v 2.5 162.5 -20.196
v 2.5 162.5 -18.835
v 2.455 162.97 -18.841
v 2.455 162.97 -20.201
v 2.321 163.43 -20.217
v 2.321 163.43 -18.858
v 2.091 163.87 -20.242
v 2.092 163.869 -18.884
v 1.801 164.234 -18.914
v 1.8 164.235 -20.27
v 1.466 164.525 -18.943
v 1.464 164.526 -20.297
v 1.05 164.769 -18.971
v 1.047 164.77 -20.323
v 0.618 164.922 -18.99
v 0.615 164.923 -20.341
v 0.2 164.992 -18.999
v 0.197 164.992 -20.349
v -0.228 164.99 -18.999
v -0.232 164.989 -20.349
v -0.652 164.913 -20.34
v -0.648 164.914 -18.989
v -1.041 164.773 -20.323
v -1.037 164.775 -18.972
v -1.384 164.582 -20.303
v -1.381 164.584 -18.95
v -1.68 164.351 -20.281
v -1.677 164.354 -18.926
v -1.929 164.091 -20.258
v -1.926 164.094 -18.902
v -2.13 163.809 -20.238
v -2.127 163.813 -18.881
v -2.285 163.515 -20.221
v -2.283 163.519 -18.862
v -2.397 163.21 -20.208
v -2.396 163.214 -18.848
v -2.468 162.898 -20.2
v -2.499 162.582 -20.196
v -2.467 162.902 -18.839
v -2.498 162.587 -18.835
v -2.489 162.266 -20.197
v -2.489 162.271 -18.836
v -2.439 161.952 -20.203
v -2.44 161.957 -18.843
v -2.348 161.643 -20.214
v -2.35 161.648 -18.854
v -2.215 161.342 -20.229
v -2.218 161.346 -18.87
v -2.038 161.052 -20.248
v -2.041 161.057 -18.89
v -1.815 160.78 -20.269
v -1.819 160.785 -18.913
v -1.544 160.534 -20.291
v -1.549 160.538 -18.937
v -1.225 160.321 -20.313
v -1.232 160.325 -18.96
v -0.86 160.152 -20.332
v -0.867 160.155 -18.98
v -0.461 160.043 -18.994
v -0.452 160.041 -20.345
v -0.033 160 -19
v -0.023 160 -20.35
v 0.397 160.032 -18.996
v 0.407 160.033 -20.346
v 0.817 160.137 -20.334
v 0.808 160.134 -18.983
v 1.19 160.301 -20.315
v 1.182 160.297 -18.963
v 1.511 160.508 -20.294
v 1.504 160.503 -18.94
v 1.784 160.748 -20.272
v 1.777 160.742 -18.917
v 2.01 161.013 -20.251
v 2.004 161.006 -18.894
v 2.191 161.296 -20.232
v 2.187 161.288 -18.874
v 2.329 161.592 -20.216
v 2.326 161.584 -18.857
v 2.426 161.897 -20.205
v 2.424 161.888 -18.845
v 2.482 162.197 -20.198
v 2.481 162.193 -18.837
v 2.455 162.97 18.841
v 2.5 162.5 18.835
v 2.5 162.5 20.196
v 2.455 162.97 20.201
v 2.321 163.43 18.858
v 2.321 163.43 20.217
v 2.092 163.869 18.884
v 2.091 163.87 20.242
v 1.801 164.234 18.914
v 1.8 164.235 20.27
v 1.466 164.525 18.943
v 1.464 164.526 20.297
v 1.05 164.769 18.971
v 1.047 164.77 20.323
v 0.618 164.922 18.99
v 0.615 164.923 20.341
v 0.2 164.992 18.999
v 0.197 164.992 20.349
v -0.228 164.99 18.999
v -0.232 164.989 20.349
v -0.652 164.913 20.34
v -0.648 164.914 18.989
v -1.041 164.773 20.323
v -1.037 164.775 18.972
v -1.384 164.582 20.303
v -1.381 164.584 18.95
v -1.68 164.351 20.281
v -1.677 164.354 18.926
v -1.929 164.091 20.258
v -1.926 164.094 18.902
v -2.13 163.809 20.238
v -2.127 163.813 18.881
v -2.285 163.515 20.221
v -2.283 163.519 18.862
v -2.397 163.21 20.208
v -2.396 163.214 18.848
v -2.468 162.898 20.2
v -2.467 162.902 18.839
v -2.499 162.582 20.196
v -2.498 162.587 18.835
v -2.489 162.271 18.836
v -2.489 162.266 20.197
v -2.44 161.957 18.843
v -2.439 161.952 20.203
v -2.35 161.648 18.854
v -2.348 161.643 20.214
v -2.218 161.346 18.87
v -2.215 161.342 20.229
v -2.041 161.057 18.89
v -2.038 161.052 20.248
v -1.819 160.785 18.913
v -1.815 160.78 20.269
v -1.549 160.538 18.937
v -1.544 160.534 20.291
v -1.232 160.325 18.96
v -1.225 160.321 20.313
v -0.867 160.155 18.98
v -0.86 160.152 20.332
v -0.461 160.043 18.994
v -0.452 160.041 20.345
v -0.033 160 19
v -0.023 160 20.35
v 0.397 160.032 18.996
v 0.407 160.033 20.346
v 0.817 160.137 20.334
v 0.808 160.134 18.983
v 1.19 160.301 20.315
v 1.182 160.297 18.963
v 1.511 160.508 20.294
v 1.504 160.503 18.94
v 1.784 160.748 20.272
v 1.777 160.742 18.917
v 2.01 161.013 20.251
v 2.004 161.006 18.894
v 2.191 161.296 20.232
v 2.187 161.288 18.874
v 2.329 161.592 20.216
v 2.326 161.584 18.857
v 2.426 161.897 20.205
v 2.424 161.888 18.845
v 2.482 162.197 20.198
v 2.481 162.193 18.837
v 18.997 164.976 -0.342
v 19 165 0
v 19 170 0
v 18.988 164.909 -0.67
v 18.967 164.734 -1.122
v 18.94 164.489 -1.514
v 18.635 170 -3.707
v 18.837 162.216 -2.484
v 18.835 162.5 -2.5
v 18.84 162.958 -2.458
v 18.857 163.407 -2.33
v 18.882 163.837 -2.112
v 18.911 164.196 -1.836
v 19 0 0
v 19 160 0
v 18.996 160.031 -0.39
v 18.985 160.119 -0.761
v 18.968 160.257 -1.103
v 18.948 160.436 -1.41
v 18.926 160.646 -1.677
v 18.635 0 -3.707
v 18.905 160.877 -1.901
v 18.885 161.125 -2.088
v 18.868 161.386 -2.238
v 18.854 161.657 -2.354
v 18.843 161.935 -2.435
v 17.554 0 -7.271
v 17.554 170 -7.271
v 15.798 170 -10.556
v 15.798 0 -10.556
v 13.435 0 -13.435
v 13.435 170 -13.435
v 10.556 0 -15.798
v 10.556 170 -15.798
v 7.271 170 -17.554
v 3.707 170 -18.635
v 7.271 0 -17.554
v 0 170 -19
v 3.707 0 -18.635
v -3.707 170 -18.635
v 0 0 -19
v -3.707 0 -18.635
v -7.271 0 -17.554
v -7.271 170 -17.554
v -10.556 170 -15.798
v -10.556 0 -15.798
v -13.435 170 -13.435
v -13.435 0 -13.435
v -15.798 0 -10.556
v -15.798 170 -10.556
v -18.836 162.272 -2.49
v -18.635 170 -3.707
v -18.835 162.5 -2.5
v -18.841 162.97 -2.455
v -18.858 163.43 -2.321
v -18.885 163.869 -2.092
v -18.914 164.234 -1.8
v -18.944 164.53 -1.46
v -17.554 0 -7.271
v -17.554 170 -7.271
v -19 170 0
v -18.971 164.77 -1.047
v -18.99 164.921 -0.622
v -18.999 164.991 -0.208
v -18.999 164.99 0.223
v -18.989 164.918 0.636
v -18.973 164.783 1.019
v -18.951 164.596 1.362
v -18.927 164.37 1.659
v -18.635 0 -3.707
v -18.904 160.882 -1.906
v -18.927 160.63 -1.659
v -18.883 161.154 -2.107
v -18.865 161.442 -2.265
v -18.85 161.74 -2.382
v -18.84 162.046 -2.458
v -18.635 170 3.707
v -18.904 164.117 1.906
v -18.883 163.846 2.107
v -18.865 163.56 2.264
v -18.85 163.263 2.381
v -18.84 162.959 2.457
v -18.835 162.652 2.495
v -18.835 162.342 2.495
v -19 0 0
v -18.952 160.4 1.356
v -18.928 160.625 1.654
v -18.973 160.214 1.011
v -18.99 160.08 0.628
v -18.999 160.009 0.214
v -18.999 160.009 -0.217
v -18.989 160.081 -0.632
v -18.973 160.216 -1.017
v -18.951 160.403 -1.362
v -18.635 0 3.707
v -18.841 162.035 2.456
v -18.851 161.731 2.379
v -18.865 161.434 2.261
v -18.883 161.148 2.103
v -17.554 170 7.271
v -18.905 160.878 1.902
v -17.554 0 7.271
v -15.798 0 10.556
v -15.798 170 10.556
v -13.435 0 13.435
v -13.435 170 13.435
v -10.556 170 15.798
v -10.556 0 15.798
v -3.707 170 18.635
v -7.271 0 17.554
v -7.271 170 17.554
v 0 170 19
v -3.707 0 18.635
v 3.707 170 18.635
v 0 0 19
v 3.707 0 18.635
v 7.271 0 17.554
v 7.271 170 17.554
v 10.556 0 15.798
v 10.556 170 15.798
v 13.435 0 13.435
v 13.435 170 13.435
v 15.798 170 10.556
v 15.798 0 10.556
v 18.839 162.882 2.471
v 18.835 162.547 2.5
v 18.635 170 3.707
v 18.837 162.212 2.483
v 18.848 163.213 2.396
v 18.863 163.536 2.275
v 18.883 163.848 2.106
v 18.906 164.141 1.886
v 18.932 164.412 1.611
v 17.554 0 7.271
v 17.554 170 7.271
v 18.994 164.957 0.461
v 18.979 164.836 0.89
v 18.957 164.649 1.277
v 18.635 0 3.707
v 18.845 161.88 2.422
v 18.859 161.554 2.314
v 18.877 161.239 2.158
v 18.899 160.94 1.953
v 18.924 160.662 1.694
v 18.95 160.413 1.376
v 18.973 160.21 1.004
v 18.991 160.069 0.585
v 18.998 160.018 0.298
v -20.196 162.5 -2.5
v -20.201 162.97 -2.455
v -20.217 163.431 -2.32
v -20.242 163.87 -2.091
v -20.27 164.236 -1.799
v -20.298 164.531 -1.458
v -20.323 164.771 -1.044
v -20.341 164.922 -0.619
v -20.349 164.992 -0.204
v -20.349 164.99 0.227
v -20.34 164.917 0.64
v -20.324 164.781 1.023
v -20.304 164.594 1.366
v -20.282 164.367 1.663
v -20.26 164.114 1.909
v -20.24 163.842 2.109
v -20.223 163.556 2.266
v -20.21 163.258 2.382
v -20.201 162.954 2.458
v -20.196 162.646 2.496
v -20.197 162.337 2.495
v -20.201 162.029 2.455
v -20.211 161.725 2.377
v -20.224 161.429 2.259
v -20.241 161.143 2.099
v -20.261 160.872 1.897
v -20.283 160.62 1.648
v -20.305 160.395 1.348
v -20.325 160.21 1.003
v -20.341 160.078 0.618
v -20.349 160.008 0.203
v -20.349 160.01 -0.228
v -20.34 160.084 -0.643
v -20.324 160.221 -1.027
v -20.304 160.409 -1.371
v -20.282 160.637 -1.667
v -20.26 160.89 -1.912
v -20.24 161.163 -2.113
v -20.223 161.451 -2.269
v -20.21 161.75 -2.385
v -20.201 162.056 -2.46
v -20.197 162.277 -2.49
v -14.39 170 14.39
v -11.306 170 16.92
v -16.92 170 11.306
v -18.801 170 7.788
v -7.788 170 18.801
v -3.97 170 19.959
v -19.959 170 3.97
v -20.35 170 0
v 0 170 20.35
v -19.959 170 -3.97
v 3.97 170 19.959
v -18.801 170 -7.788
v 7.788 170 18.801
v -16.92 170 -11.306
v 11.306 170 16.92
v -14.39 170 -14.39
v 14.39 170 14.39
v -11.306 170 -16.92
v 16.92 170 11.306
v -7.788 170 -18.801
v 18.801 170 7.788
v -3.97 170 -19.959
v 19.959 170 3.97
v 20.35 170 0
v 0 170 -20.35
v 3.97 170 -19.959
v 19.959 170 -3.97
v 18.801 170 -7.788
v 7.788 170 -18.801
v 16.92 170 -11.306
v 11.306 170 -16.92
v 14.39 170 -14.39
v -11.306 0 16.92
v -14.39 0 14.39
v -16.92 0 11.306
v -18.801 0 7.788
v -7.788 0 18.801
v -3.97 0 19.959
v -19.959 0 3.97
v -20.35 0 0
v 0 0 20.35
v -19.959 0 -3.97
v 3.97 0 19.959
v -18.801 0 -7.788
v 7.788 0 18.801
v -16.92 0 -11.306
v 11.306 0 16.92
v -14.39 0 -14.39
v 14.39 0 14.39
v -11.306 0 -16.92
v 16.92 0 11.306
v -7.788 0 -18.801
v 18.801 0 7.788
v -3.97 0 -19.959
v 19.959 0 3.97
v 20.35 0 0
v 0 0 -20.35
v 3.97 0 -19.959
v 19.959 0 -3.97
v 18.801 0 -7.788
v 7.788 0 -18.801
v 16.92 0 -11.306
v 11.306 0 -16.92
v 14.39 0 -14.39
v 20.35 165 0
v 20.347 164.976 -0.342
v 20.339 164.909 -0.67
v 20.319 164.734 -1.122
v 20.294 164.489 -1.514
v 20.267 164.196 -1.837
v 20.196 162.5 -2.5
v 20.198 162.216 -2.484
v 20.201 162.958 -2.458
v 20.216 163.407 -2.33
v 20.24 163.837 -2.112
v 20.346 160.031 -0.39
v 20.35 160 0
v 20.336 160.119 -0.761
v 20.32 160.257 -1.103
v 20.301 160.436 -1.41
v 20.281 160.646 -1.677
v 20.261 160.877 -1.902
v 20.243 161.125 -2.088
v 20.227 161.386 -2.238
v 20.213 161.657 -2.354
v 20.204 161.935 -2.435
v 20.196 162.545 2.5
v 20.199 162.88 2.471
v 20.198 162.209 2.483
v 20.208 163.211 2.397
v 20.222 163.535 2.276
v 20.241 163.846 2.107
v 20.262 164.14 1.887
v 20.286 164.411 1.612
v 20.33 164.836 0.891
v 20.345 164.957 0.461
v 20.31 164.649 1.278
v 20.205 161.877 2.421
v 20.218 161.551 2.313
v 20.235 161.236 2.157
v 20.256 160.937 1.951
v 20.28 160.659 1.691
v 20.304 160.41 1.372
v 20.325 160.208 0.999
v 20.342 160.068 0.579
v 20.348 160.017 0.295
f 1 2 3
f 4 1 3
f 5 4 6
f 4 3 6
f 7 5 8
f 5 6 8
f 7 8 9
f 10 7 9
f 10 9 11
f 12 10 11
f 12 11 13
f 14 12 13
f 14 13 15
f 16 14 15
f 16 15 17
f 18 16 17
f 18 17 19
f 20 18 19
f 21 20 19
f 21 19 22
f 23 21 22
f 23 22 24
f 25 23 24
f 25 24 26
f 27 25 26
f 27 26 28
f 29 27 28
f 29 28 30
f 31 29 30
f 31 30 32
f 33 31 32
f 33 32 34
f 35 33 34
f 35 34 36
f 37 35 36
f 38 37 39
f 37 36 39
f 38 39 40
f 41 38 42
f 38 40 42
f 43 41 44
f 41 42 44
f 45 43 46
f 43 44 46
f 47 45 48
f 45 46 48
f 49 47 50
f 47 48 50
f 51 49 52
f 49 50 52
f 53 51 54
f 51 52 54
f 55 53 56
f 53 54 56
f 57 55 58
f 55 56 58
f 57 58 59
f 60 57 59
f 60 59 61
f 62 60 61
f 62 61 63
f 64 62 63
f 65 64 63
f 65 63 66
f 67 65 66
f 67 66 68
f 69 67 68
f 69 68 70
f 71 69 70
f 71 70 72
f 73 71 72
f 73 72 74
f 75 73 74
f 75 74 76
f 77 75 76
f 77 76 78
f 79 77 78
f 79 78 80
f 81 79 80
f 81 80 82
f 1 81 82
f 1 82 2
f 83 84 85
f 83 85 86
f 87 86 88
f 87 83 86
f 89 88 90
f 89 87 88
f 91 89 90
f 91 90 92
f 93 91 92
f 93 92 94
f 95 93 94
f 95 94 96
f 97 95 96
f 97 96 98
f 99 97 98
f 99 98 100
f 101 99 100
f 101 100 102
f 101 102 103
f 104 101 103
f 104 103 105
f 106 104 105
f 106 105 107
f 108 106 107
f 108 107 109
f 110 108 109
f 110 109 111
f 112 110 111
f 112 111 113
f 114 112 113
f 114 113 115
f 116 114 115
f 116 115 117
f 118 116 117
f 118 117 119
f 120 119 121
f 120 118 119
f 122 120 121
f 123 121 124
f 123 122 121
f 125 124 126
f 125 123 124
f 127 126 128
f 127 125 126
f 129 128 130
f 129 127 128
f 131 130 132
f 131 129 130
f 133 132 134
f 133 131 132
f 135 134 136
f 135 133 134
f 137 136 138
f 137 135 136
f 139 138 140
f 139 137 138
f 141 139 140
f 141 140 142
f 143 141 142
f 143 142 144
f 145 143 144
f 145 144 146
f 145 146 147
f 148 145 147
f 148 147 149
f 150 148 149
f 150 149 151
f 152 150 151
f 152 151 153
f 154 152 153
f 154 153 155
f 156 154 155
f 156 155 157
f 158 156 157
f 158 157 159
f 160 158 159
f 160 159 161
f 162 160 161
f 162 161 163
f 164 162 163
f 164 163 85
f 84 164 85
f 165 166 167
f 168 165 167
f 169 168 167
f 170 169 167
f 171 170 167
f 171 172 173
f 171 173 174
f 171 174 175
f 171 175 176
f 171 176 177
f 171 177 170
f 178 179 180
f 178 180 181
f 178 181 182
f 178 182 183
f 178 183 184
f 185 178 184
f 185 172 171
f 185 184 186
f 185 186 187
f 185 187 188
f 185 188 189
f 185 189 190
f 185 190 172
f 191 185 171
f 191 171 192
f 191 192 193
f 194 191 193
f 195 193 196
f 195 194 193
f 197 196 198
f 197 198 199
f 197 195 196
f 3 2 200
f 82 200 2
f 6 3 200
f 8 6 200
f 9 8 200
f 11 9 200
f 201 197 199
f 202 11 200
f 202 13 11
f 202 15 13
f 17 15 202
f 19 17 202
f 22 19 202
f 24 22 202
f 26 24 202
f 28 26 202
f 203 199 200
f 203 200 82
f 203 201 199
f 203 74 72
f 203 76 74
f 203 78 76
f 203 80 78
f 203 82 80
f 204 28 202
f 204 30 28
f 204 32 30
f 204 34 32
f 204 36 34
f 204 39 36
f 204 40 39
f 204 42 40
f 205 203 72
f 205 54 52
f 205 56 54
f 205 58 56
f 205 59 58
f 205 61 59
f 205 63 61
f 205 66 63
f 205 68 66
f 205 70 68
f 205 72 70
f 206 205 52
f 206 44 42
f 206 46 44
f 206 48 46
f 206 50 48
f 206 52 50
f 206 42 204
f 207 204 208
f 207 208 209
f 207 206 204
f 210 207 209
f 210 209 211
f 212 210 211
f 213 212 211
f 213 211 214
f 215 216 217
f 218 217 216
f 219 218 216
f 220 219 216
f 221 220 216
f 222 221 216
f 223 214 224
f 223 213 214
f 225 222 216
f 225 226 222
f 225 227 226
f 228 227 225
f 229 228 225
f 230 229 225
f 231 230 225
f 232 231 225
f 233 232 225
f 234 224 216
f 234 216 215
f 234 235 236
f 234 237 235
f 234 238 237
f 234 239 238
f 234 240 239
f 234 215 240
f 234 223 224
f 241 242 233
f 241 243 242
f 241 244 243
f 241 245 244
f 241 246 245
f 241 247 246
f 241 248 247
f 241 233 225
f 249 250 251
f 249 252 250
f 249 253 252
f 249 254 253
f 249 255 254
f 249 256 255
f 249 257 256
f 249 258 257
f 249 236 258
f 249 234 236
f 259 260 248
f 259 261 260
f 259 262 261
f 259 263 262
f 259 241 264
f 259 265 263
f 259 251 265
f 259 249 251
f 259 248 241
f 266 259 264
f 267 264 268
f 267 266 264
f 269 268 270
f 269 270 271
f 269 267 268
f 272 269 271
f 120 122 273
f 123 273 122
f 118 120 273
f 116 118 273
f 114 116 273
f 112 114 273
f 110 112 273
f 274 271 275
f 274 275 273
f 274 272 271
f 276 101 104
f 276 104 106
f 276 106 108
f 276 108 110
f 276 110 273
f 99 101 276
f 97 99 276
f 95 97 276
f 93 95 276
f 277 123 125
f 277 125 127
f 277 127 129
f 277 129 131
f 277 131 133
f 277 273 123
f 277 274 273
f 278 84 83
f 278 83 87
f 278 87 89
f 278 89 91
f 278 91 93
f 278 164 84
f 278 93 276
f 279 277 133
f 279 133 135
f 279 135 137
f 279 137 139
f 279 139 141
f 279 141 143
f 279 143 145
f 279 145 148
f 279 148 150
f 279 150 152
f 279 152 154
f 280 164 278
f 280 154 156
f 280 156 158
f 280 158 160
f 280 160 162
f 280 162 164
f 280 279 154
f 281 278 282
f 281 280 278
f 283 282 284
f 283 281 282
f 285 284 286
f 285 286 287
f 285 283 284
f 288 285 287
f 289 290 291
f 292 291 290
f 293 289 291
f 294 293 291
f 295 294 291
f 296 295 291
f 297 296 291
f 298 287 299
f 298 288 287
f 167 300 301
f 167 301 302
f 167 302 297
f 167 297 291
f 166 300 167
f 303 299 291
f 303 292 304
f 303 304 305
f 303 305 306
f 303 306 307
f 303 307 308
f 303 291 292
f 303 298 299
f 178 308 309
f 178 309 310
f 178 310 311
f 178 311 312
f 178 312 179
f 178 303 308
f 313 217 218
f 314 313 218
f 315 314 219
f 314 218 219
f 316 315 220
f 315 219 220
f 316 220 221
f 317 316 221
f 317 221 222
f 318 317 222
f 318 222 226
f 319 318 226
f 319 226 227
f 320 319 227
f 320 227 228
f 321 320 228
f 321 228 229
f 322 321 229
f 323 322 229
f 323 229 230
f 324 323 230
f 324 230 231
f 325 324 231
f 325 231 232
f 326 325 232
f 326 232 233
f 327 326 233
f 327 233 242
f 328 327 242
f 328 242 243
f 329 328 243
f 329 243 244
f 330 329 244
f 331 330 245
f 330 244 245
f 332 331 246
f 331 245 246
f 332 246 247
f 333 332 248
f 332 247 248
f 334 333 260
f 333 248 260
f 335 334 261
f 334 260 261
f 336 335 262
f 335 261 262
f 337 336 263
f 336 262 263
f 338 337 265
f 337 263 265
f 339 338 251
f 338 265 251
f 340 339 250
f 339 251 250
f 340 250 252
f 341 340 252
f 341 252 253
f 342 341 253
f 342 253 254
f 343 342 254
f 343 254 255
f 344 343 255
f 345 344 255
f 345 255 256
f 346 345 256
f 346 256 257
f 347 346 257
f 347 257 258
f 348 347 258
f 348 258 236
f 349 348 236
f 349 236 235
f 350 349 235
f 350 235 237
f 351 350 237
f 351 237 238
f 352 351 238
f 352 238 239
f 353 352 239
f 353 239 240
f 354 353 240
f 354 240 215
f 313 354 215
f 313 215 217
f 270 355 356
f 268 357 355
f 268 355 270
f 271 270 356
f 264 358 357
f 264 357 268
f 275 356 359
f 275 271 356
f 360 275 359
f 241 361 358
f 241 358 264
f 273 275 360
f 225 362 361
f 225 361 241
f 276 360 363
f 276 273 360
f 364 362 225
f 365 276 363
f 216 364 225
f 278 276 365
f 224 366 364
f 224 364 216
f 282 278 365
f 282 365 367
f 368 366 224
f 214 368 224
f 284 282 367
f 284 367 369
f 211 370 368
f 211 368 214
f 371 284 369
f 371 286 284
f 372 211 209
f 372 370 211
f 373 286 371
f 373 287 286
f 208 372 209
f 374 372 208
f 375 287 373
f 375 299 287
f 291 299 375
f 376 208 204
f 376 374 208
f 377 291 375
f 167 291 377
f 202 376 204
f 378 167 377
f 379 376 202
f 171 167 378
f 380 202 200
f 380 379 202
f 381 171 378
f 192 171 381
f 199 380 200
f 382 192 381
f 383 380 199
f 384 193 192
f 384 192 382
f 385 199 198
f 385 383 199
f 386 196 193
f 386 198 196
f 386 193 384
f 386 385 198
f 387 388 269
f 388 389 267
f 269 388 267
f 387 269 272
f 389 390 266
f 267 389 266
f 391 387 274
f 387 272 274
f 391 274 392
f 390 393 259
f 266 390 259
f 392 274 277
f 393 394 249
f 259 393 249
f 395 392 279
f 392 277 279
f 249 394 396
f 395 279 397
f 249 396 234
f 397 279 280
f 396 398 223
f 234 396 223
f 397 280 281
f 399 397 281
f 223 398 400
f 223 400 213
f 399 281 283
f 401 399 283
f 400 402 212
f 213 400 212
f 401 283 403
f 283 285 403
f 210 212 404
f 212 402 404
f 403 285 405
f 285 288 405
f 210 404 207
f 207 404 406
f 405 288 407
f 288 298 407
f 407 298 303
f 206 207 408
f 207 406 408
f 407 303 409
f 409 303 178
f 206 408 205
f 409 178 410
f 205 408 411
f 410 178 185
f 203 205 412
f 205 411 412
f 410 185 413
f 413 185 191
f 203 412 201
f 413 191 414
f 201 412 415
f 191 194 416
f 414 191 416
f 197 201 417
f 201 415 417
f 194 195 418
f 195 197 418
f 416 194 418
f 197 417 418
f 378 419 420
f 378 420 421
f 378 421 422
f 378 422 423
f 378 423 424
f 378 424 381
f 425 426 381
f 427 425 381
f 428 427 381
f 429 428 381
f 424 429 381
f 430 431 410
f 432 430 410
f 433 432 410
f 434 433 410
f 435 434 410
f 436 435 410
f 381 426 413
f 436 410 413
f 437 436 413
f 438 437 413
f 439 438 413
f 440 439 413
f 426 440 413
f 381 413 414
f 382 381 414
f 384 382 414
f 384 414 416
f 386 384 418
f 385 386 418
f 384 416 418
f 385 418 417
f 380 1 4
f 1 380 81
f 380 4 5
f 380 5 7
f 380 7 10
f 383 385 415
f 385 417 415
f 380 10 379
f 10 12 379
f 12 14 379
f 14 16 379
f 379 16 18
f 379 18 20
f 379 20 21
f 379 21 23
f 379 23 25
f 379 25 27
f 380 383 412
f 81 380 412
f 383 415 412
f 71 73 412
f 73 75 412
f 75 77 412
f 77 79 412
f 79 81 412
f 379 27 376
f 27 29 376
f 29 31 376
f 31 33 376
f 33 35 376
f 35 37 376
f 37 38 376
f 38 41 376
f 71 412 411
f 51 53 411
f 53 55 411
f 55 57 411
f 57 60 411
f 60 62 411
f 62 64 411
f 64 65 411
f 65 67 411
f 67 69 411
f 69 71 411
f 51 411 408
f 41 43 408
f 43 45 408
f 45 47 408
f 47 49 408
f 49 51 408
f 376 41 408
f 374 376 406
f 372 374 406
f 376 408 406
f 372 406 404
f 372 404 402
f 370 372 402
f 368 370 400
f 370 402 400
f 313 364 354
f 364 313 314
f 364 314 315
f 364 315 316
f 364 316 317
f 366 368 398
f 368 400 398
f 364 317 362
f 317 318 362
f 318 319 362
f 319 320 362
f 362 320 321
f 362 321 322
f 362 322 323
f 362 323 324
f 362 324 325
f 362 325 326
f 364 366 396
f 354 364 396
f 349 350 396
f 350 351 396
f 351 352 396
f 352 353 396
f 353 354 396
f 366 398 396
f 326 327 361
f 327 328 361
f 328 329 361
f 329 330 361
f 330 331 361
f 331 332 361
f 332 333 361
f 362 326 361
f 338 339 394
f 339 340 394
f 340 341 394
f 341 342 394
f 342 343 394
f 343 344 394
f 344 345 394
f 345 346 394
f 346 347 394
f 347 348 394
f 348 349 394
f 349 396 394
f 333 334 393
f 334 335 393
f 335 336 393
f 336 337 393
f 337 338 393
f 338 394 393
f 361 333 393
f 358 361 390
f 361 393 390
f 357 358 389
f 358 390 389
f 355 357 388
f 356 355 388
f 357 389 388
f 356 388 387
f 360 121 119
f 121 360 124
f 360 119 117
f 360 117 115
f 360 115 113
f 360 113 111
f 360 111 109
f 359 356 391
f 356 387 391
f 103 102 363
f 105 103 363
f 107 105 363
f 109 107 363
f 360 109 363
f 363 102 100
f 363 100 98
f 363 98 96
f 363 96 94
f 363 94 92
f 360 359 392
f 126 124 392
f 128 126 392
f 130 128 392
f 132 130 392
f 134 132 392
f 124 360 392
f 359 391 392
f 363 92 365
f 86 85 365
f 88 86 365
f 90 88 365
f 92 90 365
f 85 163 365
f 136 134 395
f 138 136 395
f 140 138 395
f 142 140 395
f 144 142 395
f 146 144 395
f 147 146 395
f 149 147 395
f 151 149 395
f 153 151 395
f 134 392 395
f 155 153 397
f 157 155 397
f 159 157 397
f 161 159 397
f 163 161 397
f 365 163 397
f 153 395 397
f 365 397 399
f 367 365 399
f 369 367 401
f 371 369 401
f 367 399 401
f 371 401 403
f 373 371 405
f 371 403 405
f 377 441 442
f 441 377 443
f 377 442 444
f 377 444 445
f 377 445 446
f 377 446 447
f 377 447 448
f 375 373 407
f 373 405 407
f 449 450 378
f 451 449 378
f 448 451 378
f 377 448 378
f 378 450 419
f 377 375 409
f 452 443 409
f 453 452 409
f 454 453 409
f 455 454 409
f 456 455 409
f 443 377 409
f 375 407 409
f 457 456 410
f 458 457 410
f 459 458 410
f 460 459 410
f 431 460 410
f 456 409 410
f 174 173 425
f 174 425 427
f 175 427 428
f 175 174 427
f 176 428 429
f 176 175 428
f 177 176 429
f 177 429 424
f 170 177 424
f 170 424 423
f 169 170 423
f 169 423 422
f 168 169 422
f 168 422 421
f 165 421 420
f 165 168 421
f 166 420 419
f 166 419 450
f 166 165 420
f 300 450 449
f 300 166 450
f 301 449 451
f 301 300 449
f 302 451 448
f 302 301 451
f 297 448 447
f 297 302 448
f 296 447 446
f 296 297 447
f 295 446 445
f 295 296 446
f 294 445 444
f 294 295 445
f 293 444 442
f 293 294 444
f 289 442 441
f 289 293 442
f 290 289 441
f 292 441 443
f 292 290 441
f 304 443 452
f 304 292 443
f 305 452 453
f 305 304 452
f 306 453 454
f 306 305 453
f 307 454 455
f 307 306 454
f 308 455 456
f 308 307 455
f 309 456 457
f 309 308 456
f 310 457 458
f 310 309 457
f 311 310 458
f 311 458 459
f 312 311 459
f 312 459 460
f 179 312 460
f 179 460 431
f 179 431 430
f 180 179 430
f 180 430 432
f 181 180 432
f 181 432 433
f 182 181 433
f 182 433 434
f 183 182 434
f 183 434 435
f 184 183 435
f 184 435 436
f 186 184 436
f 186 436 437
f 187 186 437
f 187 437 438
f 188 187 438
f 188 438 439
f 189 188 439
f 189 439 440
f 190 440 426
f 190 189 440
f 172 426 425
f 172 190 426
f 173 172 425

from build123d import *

# Parameters (mm, degrees)
SKIZZE1_R                            = 20.35
SKIZZE1_R_2                          = 19
AUFSATZ_LINEAR_AUSTRAGEN1_DEPTH      = 170
SKIZZE2_R                            = 2.5
SCHNITT_LINEAR_AUSTRAGEN1_DEPTH      = 21.35
SCHNITT_LINEAR_AUSTRAGEN1_DEPTH_BACK = 21.35
SKIZZE3_R                            = 2.5
SCHNITT_LINEAR_AUSTRAGEN2_DEPTH      = 21.3500001
SCHNITT_LINEAR_AUSTRAGEN2_DEPTH_BACK = 21.3500001


with BuildPart() as part:
    # Skizze1 → Aufsatz-Linear austragen1 (new body)
    with BuildSketch(Plane(origin=(0, 0, 0), x_dir=(1, 0, 0), z_dir=(0, 1, 0))):
        Circle(SKIZZE1_R)
        Circle(SKIZZE1_R_2, mode=Mode.SUBTRACT)
    extrude(amount=AUFSATZ_LINEAR_AUSTRAGEN1_DEPTH)

    # Skizze2 → Schnitt-Linear austragen1 (cut, two sides)
    with BuildSketch(Plane.XY) as schnitt_linear_austragen1_sk:
        with Locations((0, 162.5)):
            Circle(SKIZZE2_R)
    extrude(amount=SCHNITT_LINEAR_AUSTRAGEN1_DEPTH, mode=Mode.SUBTRACT)
    extrude(schnitt_linear_austragen1_sk.sketch, amount=-SCHNITT_LINEAR_AUSTRAGEN1_DEPTH_BACK, mode=Mode.SUBTRACT)

    # Skizze3 → Schnitt-Linear austragen2 (cut, two sides)
    with BuildSketch(Plane(origin=(0, 0, 0), x_dir=(0, 0, -1), z_dir=(1, 0, 0))) as schnitt_linear_austragen2_sk:
        with Locations((0, 162.5)):
            Circle(SKIZZE3_R)
    extrude(amount=SCHNITT_LINEAR_AUSTRAGEN2_DEPTH, mode=Mode.SUBTRACT)
    extrude(schnitt_linear_austragen2_sk.sketch, amount=-SCHNITT_LINEAR_AUSTRAGEN2_DEPTH_BACK, mode=Mode.SUBTRACT)


solid = part.part
